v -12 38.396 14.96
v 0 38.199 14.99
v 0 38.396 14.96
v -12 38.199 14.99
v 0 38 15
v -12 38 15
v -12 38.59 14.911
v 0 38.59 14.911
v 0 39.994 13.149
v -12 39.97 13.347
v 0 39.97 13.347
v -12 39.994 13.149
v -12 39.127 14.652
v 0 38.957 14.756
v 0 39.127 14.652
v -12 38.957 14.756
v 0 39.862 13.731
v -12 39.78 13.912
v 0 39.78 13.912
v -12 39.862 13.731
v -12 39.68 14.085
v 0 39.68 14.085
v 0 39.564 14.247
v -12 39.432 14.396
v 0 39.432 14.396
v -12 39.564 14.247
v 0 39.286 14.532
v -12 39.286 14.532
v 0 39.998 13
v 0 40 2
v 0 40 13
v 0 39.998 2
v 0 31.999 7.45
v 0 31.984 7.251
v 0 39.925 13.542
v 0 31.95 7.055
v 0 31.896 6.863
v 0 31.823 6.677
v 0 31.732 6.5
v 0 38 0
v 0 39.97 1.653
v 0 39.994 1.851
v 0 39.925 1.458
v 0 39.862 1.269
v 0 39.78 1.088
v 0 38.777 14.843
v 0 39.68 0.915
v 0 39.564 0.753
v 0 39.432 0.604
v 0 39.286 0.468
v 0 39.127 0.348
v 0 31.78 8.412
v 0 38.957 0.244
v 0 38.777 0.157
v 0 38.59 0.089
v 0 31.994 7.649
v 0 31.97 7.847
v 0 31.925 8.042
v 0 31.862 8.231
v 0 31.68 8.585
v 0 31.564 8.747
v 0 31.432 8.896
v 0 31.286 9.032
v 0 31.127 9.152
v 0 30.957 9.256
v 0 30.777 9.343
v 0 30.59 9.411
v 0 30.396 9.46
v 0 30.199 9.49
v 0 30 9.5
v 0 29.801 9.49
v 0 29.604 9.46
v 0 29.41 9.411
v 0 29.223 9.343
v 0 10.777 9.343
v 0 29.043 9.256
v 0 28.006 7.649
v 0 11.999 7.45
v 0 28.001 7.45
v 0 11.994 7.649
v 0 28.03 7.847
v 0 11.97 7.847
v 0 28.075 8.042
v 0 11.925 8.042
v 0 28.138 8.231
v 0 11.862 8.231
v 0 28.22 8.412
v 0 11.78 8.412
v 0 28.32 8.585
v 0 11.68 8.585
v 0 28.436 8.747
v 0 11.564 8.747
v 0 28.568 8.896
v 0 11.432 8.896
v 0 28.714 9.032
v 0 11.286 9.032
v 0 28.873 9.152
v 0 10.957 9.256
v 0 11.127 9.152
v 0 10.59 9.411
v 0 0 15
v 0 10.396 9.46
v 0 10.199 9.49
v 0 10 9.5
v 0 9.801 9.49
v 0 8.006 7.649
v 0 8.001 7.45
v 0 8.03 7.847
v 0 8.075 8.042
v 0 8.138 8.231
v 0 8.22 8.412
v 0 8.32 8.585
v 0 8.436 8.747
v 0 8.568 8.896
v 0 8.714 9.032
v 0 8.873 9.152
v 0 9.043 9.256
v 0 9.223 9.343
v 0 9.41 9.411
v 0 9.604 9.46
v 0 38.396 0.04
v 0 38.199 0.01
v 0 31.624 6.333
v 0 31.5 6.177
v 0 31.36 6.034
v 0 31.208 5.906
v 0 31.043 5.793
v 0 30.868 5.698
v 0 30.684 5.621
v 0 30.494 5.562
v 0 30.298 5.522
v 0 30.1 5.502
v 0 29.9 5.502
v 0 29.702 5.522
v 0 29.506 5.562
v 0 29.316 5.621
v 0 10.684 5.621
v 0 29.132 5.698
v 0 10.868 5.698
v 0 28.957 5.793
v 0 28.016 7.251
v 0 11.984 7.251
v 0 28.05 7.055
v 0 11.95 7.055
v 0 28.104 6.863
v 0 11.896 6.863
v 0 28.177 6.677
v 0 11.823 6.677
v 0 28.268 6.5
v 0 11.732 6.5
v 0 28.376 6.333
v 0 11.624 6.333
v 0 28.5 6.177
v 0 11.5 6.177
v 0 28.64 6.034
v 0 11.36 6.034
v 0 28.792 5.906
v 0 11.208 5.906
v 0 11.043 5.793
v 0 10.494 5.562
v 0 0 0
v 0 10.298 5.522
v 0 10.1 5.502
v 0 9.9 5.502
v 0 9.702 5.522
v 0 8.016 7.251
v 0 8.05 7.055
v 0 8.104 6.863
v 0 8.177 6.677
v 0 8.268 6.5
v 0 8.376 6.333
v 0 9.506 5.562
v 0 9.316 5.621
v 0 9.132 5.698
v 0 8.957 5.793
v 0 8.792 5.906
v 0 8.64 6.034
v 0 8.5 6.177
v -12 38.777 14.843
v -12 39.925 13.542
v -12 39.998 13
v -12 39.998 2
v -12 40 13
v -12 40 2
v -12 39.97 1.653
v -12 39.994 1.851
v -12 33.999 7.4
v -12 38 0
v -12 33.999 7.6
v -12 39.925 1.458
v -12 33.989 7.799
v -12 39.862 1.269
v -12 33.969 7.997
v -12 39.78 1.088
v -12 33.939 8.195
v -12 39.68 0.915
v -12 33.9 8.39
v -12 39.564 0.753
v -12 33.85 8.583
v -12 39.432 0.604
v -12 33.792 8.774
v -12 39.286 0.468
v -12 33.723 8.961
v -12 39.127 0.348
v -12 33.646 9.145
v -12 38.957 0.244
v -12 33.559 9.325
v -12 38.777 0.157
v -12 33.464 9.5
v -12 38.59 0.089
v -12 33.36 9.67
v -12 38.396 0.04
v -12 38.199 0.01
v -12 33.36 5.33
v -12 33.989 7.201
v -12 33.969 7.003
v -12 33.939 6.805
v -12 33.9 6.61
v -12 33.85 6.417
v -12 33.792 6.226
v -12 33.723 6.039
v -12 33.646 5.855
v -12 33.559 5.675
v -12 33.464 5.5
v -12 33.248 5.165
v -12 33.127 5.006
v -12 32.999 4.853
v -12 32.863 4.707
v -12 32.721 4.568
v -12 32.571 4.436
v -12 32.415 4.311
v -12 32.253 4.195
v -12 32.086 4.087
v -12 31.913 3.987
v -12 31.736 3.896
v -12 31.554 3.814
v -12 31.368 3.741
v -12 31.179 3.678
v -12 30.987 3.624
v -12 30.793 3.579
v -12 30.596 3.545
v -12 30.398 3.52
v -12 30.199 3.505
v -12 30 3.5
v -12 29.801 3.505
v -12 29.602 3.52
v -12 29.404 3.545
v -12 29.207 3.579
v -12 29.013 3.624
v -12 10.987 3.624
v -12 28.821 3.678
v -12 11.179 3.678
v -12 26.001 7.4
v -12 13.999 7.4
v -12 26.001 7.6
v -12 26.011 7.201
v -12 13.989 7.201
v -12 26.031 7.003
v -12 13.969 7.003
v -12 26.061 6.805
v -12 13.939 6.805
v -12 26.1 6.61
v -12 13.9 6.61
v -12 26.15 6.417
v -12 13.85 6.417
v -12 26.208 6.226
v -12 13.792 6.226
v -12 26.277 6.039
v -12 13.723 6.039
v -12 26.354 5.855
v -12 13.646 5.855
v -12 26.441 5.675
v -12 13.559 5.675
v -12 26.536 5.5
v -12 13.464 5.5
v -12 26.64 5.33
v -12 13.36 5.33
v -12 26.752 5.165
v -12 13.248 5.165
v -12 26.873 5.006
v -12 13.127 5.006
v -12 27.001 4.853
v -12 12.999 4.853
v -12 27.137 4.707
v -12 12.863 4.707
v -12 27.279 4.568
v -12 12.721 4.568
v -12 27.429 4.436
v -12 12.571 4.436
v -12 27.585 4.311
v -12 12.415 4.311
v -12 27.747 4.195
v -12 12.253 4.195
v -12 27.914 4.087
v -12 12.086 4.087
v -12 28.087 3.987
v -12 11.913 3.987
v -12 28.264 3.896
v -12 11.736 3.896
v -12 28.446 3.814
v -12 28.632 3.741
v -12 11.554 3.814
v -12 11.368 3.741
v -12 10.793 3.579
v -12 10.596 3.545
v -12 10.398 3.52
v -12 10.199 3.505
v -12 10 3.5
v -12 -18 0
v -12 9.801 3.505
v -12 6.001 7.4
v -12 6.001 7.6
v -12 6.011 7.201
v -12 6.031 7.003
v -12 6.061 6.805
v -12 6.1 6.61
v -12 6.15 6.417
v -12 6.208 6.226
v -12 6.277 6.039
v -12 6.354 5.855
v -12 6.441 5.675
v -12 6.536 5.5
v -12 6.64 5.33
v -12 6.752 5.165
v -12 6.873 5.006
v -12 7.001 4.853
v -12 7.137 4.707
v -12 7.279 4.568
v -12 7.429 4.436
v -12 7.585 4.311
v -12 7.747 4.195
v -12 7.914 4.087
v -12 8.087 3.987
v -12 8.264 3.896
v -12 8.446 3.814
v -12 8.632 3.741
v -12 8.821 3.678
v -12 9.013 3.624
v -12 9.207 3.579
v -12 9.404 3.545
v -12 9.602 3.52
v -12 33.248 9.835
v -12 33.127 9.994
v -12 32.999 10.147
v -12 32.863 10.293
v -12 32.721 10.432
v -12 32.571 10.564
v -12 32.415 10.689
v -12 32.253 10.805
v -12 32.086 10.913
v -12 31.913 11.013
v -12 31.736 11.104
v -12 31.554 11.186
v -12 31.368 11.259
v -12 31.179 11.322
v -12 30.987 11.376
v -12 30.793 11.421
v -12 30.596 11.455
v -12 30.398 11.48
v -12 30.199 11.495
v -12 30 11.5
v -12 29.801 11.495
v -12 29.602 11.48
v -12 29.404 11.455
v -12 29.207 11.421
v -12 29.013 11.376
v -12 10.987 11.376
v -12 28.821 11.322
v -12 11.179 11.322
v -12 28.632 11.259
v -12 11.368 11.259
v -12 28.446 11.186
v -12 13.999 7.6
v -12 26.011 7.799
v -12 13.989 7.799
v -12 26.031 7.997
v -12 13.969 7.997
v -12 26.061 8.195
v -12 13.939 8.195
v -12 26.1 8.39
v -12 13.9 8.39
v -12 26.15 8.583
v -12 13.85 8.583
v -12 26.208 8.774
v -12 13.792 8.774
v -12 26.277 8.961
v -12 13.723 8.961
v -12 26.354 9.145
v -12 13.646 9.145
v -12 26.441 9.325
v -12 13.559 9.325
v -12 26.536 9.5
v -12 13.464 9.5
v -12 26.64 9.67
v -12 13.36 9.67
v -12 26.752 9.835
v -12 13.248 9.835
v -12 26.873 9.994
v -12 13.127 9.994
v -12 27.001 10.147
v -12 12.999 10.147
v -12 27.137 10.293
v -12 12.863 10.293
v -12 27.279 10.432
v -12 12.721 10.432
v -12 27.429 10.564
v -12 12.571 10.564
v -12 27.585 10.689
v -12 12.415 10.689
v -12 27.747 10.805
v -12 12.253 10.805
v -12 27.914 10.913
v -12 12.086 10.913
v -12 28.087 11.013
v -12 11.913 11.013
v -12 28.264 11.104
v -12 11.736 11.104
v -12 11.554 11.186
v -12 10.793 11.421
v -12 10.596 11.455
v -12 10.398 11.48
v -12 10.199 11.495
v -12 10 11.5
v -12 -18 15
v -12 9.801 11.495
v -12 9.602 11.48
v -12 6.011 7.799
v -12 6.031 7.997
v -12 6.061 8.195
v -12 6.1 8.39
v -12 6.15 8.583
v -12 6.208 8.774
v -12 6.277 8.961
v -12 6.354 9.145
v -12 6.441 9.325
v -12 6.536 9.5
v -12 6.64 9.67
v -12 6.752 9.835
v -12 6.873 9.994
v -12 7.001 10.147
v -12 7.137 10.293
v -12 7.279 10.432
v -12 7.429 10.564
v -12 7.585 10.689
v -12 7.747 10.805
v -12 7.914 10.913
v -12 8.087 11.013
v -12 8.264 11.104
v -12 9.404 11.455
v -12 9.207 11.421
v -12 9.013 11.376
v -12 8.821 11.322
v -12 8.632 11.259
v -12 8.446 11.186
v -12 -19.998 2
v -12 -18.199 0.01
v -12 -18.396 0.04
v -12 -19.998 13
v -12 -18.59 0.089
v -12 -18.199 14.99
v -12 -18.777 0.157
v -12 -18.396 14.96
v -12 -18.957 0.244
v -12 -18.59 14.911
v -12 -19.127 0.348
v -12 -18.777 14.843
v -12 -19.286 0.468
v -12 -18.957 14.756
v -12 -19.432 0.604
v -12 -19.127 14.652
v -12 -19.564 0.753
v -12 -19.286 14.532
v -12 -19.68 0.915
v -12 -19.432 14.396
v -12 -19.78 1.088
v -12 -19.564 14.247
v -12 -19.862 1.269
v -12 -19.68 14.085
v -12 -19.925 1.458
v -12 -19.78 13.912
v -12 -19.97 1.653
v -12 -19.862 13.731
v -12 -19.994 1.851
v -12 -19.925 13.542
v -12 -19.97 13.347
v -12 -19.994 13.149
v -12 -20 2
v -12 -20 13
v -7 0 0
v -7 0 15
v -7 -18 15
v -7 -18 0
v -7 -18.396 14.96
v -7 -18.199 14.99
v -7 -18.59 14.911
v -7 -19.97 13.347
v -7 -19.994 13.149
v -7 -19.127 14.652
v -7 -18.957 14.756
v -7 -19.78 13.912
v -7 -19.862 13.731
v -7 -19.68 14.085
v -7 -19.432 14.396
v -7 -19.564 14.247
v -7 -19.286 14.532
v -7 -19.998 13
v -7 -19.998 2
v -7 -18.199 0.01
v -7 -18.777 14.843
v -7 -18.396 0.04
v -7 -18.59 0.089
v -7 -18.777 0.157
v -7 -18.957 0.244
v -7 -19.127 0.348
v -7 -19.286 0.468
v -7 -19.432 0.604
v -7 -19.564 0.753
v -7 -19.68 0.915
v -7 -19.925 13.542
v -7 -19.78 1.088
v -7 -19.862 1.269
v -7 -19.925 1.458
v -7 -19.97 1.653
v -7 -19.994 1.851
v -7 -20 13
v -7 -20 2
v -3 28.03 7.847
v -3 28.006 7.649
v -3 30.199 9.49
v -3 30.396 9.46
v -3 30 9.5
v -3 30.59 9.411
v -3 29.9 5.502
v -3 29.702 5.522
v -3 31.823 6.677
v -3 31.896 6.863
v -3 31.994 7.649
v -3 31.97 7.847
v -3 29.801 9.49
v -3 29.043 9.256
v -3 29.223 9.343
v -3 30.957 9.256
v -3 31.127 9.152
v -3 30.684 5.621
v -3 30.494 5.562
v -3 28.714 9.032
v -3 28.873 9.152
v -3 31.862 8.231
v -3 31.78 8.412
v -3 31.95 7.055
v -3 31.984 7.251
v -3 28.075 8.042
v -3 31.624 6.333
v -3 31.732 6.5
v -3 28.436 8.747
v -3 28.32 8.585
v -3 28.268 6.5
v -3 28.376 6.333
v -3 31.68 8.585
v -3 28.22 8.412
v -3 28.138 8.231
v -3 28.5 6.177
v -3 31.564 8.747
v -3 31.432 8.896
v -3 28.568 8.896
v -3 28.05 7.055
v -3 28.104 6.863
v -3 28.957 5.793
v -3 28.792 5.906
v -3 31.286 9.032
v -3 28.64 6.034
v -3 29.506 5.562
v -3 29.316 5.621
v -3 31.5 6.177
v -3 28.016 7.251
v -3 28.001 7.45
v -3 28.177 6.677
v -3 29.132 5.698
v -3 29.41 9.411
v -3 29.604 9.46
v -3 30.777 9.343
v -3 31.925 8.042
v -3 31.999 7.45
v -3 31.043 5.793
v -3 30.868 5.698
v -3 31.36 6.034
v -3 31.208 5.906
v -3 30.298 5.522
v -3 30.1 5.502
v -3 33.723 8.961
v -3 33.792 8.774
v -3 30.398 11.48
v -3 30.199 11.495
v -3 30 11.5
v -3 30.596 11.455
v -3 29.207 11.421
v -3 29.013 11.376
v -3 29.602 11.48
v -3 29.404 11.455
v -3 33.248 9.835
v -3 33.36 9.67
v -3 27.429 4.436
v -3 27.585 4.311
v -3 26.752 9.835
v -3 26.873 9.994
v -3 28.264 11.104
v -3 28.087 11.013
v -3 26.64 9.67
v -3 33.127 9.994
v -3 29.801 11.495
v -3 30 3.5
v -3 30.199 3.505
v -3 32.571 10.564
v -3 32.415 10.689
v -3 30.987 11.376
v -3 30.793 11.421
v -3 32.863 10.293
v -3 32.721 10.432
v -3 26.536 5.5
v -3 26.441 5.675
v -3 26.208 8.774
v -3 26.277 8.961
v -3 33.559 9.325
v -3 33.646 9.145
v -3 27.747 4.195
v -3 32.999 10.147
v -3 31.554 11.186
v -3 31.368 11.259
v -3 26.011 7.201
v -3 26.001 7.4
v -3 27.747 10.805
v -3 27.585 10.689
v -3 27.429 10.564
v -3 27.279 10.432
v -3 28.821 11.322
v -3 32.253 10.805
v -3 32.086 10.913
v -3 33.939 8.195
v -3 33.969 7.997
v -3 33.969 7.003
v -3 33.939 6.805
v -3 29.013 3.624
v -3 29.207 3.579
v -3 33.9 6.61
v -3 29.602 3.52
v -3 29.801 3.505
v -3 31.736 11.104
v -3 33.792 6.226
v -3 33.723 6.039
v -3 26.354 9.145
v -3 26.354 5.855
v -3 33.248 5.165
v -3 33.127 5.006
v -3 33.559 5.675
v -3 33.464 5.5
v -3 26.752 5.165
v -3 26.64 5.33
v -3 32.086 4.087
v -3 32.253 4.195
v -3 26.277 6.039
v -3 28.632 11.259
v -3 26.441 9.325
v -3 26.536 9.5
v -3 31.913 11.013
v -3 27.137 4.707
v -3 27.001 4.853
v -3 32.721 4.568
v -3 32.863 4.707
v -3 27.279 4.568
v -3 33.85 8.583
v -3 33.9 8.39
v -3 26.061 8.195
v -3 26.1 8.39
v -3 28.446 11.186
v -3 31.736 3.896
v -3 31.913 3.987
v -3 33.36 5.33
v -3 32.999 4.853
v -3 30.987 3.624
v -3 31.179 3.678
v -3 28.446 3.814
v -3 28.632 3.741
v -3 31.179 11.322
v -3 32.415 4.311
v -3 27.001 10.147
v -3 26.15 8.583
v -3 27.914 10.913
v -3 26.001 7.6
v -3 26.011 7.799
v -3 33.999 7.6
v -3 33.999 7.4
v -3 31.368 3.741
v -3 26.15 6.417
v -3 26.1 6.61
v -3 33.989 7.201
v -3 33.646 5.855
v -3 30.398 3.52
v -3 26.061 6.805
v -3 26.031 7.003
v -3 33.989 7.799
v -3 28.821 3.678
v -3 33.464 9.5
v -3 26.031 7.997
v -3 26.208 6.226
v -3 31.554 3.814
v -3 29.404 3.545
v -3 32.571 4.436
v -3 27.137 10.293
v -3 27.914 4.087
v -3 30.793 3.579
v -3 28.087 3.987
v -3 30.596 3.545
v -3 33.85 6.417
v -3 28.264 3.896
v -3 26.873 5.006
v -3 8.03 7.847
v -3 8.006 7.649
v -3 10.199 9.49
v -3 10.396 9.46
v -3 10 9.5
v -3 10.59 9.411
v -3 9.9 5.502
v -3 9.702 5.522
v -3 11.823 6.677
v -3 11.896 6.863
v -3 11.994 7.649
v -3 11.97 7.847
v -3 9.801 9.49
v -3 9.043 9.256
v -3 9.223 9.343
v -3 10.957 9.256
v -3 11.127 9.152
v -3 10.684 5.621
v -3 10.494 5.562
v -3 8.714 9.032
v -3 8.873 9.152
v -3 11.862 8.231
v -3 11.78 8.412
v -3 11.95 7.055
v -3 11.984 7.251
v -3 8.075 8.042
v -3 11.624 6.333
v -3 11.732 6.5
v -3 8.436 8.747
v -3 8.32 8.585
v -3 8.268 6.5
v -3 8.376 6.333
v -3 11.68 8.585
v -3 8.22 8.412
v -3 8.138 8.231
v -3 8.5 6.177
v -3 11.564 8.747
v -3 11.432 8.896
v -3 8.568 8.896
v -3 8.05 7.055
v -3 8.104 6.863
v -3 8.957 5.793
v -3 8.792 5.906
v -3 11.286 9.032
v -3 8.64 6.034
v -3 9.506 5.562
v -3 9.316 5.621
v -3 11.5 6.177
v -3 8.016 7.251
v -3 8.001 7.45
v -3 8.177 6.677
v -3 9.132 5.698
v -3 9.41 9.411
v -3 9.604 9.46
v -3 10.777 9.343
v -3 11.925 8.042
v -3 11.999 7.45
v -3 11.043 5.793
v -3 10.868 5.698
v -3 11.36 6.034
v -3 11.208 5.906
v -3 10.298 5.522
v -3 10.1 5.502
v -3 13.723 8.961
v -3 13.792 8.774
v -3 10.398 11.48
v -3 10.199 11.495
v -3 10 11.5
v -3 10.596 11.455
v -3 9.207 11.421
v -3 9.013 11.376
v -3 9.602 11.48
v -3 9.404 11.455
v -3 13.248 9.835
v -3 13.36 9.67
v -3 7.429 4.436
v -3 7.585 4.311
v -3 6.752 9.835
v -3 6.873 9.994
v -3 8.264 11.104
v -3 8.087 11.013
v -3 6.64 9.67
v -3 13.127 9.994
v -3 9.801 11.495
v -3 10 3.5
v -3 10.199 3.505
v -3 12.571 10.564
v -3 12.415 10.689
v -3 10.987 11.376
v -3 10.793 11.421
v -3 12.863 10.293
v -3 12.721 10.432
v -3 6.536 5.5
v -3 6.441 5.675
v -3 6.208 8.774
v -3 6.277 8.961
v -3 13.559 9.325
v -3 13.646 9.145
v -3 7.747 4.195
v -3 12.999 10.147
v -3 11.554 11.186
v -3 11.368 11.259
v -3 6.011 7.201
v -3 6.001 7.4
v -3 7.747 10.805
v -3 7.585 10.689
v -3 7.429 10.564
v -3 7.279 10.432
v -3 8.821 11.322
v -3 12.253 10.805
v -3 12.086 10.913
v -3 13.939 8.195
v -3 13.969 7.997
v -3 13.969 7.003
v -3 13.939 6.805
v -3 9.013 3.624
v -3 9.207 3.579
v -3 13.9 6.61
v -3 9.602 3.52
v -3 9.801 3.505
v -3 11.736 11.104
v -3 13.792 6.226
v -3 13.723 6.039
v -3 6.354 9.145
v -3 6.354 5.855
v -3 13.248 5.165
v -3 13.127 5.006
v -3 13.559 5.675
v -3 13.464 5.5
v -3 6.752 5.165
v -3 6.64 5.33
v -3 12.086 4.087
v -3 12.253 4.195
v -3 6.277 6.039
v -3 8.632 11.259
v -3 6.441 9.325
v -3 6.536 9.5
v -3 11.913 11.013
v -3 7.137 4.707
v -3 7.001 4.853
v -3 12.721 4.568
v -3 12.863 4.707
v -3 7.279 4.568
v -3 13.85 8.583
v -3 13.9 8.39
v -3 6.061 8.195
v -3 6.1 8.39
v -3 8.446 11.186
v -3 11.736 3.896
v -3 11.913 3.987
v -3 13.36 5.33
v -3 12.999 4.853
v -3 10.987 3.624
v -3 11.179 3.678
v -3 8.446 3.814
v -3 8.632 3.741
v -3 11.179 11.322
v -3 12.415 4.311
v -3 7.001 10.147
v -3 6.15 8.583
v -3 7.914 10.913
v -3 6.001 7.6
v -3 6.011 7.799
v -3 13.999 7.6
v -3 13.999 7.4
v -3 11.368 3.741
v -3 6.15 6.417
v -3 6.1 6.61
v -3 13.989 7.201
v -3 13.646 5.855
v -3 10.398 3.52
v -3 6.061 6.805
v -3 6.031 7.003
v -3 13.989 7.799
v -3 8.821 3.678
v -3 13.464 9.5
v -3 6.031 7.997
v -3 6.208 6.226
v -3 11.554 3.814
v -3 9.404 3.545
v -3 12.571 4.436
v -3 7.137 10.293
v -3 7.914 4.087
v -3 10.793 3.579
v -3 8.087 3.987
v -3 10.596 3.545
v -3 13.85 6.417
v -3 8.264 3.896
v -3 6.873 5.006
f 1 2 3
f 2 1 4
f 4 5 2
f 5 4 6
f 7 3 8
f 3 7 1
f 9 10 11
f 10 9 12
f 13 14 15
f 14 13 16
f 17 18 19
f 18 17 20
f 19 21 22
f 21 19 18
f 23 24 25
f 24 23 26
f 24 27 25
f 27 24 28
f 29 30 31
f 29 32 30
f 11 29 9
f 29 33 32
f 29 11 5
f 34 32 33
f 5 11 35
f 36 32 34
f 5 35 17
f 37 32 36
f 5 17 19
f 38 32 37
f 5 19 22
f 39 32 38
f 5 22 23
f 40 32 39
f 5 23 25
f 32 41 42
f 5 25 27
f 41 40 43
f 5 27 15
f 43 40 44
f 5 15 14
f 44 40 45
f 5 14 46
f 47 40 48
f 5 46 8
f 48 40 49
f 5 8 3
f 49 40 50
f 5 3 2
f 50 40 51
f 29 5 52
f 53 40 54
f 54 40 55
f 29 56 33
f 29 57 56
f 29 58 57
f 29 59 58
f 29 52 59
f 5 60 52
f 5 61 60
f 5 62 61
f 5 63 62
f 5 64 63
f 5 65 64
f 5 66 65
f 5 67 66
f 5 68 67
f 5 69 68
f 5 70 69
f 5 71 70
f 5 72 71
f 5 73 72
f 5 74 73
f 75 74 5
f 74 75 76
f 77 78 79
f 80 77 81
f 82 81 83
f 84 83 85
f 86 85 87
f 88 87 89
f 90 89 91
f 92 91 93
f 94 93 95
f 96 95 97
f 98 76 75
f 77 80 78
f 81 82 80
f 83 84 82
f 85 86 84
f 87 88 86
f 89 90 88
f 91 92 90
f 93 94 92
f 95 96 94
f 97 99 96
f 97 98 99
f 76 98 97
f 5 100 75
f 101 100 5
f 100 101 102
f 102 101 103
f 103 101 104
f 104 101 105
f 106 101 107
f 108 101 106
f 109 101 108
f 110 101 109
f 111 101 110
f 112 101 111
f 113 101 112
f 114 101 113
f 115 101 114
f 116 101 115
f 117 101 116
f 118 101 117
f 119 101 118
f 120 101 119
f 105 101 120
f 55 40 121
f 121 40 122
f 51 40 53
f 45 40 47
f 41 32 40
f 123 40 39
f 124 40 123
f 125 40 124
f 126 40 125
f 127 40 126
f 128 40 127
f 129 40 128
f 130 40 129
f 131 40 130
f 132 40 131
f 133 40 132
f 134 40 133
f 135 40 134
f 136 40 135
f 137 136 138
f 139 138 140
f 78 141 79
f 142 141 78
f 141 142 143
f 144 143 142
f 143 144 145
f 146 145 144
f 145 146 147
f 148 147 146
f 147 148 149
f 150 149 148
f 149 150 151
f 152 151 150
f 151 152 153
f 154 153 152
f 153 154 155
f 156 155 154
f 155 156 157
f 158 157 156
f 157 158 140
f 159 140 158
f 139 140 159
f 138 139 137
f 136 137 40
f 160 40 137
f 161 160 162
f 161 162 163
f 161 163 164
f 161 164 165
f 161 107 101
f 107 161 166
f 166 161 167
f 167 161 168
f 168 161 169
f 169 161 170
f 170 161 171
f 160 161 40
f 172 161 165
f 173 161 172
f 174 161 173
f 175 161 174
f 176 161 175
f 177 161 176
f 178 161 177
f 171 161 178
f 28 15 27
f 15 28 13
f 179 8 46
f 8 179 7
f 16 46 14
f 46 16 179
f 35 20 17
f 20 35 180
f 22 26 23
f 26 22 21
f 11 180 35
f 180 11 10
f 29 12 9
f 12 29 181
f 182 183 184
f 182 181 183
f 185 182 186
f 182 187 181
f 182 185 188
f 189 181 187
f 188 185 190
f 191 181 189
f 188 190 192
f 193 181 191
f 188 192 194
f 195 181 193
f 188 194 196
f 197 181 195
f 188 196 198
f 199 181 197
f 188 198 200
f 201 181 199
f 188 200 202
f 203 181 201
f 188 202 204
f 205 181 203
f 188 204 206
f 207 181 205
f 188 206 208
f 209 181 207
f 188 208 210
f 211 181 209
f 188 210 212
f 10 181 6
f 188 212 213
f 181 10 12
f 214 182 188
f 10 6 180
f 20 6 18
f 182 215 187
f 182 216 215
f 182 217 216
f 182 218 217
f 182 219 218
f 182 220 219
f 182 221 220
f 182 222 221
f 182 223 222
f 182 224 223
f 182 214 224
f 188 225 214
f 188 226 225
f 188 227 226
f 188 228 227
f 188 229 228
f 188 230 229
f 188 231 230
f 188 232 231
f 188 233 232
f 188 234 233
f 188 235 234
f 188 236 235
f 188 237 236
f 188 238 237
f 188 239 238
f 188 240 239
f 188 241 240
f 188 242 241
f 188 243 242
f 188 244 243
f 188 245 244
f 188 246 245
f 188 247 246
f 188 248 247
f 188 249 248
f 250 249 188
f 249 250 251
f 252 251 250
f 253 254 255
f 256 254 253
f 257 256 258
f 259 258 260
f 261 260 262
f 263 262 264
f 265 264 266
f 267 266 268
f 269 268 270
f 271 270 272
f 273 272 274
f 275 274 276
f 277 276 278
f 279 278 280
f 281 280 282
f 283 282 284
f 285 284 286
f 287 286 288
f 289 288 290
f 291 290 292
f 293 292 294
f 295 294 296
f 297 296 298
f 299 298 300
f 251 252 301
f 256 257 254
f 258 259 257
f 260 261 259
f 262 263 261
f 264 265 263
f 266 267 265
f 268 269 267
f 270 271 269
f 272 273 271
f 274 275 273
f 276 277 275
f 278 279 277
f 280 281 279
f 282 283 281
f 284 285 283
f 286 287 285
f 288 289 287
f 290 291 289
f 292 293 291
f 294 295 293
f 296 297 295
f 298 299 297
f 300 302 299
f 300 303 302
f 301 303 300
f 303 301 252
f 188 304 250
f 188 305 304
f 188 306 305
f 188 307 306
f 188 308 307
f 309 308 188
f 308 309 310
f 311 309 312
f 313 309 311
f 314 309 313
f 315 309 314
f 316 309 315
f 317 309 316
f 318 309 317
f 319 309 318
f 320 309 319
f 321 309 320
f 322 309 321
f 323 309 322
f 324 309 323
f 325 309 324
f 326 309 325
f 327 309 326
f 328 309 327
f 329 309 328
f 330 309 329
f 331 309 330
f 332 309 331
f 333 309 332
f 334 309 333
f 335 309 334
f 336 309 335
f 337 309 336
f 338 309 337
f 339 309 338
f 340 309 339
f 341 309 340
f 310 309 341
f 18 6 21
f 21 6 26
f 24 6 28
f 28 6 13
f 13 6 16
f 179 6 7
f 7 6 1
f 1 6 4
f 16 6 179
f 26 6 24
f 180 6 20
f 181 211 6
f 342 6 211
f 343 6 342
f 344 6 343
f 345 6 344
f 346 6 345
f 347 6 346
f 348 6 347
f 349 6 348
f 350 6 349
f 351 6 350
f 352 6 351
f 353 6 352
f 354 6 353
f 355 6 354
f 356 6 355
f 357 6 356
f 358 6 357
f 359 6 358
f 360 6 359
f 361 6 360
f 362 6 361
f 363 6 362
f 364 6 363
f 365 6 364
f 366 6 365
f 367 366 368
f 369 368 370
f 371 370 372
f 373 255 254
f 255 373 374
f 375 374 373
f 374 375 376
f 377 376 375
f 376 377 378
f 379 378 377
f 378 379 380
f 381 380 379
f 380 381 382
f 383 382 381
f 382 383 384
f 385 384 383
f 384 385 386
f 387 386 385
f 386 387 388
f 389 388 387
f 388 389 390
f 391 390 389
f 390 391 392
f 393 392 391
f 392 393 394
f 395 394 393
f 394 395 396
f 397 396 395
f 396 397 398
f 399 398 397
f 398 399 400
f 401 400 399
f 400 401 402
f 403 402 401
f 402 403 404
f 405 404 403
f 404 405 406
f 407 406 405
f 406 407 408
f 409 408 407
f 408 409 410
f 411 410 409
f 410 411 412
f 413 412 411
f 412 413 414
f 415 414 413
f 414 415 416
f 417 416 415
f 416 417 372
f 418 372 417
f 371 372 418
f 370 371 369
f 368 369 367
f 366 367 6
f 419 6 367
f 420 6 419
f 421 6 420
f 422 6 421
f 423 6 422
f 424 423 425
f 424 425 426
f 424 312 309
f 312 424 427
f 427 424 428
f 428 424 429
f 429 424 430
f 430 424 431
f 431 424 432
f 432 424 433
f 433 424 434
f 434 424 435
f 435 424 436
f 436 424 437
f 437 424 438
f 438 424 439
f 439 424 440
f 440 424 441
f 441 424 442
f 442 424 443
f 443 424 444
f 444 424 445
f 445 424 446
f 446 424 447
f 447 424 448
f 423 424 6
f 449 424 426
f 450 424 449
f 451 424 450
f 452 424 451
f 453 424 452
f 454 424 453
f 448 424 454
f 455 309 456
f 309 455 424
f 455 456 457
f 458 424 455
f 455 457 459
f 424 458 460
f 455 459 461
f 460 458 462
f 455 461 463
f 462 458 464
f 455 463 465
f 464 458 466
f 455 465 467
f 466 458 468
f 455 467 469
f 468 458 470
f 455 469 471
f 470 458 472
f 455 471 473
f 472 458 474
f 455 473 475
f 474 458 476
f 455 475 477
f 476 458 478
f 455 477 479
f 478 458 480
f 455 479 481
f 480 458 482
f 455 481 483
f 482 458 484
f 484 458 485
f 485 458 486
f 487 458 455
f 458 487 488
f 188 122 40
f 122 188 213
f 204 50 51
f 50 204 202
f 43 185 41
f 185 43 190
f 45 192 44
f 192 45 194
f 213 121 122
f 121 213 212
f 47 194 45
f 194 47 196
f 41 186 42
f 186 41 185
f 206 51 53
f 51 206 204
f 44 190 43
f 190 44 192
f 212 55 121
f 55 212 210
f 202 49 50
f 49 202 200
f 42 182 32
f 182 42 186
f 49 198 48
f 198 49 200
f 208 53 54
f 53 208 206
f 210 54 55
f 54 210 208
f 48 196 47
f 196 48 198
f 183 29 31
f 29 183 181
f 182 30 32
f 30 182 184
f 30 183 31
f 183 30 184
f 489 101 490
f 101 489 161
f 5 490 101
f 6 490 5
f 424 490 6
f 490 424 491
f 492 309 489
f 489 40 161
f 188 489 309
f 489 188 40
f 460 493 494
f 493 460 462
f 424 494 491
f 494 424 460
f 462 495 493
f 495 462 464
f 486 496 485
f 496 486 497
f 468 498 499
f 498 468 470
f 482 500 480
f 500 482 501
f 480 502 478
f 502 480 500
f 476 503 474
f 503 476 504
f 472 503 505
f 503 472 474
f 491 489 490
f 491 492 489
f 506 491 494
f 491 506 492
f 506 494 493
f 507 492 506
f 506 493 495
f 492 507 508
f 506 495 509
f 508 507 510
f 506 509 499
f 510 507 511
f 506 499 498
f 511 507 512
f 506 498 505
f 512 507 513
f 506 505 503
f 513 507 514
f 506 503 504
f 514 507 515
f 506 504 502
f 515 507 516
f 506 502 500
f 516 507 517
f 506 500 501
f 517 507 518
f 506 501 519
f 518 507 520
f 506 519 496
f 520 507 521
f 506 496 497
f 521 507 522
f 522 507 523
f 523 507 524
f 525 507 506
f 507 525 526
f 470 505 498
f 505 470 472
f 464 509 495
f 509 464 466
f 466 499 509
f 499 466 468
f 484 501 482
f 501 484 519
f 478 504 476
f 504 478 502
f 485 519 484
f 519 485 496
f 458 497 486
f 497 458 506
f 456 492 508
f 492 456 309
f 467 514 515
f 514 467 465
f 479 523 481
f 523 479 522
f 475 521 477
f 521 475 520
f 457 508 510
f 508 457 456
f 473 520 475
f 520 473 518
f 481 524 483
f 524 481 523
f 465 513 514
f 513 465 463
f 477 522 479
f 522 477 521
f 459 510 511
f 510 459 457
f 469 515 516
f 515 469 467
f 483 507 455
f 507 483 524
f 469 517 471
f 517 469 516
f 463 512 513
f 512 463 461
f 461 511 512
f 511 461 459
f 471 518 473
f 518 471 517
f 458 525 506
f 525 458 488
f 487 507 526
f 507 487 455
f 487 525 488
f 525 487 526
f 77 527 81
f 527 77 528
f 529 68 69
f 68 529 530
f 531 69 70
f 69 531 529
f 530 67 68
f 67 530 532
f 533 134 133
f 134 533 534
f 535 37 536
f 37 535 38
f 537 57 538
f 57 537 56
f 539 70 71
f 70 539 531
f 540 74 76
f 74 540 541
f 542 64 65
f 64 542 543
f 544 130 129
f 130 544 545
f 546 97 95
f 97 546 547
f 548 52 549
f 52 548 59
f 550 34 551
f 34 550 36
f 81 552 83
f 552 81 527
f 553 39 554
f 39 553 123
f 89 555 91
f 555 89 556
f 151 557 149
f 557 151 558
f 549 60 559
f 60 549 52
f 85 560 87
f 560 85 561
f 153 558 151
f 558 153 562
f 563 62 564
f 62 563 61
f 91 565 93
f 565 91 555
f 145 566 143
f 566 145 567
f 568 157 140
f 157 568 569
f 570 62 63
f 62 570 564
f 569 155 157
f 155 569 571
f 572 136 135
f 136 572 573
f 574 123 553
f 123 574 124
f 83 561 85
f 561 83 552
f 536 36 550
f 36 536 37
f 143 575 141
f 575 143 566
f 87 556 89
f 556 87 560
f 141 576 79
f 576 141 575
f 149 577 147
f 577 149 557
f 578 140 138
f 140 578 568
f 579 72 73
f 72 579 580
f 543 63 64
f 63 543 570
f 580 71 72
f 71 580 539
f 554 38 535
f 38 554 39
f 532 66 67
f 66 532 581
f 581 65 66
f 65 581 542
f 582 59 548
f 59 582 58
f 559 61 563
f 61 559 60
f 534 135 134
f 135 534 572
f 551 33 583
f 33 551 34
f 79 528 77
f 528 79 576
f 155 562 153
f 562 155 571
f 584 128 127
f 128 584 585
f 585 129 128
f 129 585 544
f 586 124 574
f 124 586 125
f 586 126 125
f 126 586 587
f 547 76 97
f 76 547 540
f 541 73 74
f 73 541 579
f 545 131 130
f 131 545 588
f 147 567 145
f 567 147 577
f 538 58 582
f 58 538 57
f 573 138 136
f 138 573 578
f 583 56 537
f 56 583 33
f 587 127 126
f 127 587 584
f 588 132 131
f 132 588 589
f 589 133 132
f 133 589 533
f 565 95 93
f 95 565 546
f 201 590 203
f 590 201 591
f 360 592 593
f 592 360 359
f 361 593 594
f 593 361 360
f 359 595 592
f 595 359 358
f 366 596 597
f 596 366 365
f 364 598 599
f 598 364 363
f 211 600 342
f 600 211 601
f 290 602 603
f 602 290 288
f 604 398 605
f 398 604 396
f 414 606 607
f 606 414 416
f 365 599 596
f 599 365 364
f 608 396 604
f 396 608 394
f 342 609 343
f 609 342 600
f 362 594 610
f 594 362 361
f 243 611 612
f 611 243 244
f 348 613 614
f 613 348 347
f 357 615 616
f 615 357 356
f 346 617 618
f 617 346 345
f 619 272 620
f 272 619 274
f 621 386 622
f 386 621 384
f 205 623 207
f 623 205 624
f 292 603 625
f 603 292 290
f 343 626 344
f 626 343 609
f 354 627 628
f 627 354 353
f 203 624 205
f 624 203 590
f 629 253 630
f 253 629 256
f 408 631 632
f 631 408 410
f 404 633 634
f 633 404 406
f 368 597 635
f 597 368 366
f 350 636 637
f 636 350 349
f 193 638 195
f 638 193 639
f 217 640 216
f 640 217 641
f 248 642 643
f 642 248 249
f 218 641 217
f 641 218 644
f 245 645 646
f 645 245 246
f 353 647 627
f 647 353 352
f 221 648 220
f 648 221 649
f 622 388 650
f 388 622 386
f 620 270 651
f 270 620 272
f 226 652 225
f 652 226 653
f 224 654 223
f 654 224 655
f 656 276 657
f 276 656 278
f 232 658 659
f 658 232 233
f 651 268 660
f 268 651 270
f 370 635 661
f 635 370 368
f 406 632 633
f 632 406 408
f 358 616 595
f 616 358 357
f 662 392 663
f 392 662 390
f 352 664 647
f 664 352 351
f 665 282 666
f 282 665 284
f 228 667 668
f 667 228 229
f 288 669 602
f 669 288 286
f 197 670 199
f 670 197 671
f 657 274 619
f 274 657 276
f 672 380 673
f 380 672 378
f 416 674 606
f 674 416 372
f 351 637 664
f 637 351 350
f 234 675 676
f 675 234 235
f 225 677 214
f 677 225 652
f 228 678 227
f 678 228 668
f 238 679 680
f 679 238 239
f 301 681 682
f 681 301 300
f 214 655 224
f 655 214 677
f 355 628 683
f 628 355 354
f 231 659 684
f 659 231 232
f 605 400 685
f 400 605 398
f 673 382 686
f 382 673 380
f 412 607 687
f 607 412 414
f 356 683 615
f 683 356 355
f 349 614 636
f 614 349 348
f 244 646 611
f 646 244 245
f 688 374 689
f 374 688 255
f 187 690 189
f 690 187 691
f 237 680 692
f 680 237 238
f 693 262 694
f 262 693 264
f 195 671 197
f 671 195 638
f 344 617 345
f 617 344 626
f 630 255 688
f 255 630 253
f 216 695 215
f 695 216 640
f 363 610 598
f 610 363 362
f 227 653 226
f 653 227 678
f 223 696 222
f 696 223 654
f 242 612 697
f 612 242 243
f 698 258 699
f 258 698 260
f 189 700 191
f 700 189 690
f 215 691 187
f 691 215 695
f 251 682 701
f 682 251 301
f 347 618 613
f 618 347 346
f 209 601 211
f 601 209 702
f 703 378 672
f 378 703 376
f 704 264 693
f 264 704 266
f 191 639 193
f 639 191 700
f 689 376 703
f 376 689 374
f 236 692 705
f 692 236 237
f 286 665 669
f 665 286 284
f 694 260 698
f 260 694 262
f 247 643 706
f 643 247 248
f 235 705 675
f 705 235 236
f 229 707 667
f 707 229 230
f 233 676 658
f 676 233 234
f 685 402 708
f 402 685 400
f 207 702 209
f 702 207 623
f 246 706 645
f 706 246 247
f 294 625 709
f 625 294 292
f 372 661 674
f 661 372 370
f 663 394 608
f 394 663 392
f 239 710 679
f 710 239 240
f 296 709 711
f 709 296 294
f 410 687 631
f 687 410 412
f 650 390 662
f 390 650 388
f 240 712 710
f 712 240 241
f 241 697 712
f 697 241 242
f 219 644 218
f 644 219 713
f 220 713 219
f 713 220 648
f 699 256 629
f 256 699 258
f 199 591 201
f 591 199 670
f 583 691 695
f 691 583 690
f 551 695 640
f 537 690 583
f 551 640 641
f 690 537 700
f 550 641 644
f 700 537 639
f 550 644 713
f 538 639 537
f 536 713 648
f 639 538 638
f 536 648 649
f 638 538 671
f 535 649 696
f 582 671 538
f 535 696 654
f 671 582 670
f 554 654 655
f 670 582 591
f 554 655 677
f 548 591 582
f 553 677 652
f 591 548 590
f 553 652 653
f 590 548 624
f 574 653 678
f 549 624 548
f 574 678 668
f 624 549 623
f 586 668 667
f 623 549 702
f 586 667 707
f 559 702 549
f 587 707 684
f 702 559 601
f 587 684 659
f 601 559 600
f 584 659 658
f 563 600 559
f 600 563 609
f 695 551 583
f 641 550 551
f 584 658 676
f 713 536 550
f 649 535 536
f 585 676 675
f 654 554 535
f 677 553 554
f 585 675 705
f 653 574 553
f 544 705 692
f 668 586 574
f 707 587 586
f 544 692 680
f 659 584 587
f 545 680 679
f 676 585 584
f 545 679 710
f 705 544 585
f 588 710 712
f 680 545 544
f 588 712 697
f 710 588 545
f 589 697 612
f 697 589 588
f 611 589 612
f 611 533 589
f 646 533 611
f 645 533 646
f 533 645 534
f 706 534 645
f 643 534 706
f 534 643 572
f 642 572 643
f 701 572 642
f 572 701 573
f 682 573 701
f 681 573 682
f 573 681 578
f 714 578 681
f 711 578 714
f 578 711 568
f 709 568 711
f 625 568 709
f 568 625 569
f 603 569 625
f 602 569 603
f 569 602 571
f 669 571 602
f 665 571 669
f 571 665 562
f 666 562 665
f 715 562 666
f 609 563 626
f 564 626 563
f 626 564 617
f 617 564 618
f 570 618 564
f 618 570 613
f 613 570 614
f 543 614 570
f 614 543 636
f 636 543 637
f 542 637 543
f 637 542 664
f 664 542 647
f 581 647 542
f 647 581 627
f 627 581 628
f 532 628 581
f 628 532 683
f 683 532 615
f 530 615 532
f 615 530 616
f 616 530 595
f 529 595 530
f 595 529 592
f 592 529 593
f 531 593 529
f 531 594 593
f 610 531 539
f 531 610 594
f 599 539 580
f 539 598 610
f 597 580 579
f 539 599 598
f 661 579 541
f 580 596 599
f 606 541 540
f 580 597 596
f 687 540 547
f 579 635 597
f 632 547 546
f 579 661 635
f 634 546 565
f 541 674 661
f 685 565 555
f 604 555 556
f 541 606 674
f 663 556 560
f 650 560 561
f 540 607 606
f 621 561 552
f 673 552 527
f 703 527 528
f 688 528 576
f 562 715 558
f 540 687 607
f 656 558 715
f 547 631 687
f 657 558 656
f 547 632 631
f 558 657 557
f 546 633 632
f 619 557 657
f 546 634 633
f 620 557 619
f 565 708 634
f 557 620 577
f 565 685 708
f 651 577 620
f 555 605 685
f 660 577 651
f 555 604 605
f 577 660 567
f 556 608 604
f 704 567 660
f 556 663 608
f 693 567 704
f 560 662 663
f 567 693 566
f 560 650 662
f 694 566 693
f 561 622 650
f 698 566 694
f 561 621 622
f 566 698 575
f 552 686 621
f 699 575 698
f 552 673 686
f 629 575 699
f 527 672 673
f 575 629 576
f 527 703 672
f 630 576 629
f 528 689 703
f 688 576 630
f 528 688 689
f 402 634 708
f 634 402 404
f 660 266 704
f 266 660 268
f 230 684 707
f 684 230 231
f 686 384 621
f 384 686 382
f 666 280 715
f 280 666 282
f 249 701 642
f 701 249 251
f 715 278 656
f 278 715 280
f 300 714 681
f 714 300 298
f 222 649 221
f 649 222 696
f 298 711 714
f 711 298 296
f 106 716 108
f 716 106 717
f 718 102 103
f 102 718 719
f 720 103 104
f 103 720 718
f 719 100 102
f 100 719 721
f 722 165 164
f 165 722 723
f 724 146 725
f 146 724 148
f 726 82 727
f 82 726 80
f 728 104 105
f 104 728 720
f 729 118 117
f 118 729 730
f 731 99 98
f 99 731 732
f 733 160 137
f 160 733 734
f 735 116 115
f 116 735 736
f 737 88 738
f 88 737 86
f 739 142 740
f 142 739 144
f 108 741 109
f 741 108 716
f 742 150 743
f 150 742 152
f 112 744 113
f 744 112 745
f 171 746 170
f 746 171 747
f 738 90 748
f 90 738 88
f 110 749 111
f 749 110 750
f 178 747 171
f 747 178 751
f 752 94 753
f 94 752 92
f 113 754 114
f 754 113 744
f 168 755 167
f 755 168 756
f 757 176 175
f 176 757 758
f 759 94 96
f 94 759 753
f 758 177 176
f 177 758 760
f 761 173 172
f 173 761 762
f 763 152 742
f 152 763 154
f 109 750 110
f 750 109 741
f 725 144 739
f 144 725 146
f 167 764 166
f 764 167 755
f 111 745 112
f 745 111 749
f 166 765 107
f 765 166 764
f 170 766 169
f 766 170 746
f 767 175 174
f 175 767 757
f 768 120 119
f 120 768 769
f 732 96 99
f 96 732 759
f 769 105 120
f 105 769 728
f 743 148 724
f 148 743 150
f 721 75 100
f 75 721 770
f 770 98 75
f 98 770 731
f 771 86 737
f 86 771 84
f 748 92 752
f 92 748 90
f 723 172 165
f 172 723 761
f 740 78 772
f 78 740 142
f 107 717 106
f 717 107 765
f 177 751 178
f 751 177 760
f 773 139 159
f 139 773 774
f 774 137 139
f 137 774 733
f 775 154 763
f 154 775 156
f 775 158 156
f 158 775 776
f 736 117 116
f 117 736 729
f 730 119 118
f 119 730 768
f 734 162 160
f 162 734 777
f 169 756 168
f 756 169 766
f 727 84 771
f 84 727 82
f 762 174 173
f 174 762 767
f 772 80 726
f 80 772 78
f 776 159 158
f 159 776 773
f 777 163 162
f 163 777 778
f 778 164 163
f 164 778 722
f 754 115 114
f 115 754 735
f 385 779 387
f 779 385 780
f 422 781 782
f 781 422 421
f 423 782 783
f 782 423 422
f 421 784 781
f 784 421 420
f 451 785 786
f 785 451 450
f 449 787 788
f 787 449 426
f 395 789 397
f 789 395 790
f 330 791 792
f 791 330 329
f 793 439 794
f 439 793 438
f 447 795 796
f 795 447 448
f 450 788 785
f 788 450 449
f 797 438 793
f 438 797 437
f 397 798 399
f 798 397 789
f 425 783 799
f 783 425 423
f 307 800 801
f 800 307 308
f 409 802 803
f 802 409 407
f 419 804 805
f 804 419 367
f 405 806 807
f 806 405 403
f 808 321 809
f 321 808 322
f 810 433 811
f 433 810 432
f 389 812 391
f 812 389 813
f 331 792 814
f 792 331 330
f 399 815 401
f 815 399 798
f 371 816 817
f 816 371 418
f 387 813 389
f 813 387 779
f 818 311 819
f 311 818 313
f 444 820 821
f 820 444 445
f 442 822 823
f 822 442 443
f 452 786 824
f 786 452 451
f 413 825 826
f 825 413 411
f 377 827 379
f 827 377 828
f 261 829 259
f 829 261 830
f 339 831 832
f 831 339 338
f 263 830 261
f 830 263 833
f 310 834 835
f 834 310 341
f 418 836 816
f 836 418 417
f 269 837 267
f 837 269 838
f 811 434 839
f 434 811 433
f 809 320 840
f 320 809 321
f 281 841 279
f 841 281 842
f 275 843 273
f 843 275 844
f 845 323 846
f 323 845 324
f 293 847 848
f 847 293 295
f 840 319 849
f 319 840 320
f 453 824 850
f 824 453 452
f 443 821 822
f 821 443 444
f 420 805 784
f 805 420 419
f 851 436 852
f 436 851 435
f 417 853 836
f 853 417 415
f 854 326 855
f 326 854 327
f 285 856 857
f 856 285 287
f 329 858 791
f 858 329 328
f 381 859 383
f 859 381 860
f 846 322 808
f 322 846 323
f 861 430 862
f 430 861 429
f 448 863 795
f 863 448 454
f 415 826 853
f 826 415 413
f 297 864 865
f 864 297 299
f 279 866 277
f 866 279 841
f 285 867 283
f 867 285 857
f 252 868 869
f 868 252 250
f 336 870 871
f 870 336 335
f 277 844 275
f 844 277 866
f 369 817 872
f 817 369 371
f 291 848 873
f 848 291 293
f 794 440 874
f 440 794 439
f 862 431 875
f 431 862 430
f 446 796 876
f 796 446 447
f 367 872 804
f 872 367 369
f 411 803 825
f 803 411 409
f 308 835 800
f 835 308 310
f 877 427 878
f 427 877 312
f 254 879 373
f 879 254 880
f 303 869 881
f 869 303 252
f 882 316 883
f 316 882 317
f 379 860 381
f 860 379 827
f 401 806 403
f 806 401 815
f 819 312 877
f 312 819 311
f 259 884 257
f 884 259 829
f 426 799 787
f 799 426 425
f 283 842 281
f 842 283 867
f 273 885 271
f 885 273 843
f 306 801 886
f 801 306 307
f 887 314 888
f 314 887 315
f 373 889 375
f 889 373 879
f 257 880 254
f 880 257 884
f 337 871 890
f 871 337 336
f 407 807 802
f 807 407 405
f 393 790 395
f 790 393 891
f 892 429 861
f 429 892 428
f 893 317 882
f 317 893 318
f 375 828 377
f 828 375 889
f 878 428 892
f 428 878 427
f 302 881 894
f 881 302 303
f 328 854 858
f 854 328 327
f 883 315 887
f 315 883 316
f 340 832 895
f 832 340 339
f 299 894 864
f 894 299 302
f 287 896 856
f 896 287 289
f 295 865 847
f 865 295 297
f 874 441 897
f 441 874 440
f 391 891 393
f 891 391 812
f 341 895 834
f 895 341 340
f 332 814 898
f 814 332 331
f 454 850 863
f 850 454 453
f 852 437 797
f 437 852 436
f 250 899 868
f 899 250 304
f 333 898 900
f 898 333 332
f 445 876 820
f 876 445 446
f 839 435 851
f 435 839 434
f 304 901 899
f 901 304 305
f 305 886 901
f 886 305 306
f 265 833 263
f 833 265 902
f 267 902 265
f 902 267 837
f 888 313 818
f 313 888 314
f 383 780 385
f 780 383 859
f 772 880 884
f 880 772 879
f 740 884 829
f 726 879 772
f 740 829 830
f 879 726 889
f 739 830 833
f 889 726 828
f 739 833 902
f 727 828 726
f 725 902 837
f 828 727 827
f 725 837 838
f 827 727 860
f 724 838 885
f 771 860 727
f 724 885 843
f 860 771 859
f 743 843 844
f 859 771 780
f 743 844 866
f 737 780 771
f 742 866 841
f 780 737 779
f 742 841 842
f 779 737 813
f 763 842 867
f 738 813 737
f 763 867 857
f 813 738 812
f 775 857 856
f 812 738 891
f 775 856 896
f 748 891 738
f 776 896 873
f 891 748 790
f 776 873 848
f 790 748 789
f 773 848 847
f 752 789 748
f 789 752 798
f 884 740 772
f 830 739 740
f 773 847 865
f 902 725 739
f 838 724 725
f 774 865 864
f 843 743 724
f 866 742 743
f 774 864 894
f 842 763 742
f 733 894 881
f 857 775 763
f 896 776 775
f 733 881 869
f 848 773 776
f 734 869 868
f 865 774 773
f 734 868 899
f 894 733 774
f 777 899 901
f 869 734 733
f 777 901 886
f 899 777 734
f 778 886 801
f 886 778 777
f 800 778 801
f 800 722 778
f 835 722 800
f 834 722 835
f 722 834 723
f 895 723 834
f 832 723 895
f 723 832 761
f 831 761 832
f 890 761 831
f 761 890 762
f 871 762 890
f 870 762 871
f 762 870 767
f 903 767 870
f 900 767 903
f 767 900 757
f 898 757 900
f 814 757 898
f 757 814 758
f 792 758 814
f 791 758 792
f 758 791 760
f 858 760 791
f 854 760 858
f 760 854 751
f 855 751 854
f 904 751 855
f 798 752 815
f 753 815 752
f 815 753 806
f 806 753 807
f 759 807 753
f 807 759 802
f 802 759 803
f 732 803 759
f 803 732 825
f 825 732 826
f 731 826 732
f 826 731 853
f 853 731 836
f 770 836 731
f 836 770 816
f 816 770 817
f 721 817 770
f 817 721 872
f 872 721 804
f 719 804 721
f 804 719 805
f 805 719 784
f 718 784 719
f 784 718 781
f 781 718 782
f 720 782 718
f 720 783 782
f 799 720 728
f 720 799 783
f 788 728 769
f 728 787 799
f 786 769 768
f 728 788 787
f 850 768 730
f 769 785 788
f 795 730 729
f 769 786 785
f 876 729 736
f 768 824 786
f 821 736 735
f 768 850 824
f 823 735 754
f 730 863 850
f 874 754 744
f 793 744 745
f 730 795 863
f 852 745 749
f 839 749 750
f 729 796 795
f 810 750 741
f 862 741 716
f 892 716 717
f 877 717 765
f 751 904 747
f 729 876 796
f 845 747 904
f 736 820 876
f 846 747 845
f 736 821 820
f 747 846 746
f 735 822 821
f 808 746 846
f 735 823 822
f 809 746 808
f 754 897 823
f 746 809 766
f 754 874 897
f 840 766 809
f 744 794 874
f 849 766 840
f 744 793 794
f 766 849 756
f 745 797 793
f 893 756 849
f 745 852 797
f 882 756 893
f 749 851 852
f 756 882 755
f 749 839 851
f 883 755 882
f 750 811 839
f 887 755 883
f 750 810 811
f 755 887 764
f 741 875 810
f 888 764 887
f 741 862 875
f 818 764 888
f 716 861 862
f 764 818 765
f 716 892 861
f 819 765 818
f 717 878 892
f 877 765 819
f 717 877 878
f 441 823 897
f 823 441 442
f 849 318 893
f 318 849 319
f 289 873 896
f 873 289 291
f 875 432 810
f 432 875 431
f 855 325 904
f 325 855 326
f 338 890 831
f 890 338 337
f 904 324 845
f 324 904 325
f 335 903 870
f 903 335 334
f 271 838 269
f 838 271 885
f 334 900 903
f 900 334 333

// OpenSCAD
// file: cable-holder-2.scad
$fa = 1.0;
$fs = 0.2;

use <../lib/lib.scad>

holeDiameter = 4.5;

module asztal()
{
	cube([50, 50, 10]);
}

module screwCut()
{
	translate([0, 0, -20])
	cylinder(d = 4, h = 40);

	cylinder(d = 8, h = 20);
}

module cableHolder2
(
)
{
	difference()
	{
		union()
		{
			rotate([0, -90, 0])
			rcube
			(
				[15, 40, 12],
				r = 4,
				flat = true,
				singleSided = true,
				aX = 0,
				aY = 0,
				aZ = 0
			);

			translate([-7, 0, 0])
			mirror([0, 1, 0])
			rotate([0, -90, 0])
			rcube
			(
				[15, 20, 5],
				r = 4,
				flat = true,
				singleSided = true,
				aX = 0,
				aY = 0,
				aZ = 0
			);
		}

		translate([-3, 30, 7.5])
		rotate([0, -90, 0])
		screwCut();

		translate([-3, 10, 7.5])
		rotate([0, -90, 0])
		screwCut();
	}
}
// file: ../lib/lib.scad
function sel(v, indices) = [ for (i = indices) v[i] ];
function eps() = 0.01;

module cmirror(v = [1, 0, 0])
{
	children();
	mirror(v)
		children();
}

module rcube2d
(
	s = [10, 10, 10],
	r = 2,
	singleSided = false,
)
{
	width = s[0];
	depth = s[1];
	height = s[2];

	union()
	{
		cmirror([0, 1, 0])
		cmirror()
		translate([(width - r) / 2, (depth - r) / 2, 0])
		cylinder(h = height, d = r);
		translate([-(width - r) / 2, -depth / 2, 0])
		cube([width - r, depth, height]);
		translate([-width / 2, -(depth - r) / 2, 0])
		cube([width, depth - r, height]);
	}

	if (singleSided)
	{
		translate([-width / 2, -depth / 2, 0])
		cube([width, r, height]);
	}
}

module rcube3d
(
	s = [10, 10, 10],
	r = 2,
	singleSided = false,
)
{
	width = s[0];
	depth = s[1];
	height = s[2];

	w2 = width - r;
	d2 = depth - r;
	h2 = height - r;

	translate([0, 0, r / 2])
	rcube2d([width, depth, h2], r);

	translate([0, 0, height / 2])
	cmirror([0, 0, 1])
	cmirror([0, 1, 0])
	translate([0, d2 / 2, (height - r) / 2])
	translate([-w2 / 2, 0, 0])
	rotate([0, 90, 0])
	cylinder(h = w2, d = r);

	translate([0, 0, height / 2])
	cmirror([0, 0, 1])
	cmirror()
	translate([w2 / 2, 0, h2 / 2])
	translate([0, d2 / 2, 0])
	rotate([90, 0, 0])
	cylinder(h = d2, d = r);

	translate([-w2 / 2, -d2 / 2, 0])
	cube([w2, d2, height]);

	translate([0, 0, height / 2])
	cmirror([0, 0, 1])
	cmirror([0, 1, 0])
	cmirror()
	translate([w2 / 2, d2 / 2, h2 / 2])
	sphere(r / 2);

	if (singleSided)
	{
		translate([0, -depth / 2, height / 2])
		rotate([-90, 0, 0])
		rcube2d([width, height, r], r);
	}
}

module rcube
(
	s = [10, 10, 10],
	r = 2,
	flat = true,
	singleSided = false,
	aX = 0,
	aY = 0,
	aZ = 0,
)
{
	width = s[0];
	depth = s[1];
	height = s[2];

	rw = r > width ? width : r;

	translate
	([
		(1 - aX) * width / 2,
		(1 - aY) * depth / 2,
		-aZ * height / 2
	])
	if (flat)
		rcube2d(s, rw, singleSided);
	else
	{
		rh = rw > height ? height : rw;
		rcube3d(s, rh, singleSided);
	}
}

module chamfer
(
	s = [10, 20, 6],
	round = true,
	aX = 0,
	aY = 0,
	aZ = 0,
	rotation = 0,
)
{
	width = s[0];
	depth = s[1];
	height = s[2];

	r = width < height ? width : height;

	rotate([0, rotation * 90, 0])
	translate
	([
		-aX * r / 2,
		-aY * depth / 2,
		-aZ * r / 2
	])
	if (round)
	{
		difference()
		{
			cube(s);

			translate([r, -depth / 2, 0])
			union()
			{
				translate([0, 0, r])
				rotate([-90, 0, 0])
				cylinder(d = 2 * r, h = 2 * depth);

				translate([0, 0, -r / 2])
				cube([2 * width, 2 * depth, 2 * r]);

				translate([-1.5 * r, 0, r])
				cube([2 * r, 2 * depth, 2 * height]);
			}
		}
	}
	else
	{
		difference()
		{
			cube(s);

			translate([0, 1.5 * depth, 0])
			rotate([90, 0, 0])
			linear_extrude(2 * depth)
			polygon
			([
				[ 2 * width, -1 * height],
				[ 2 * width,  2 * height],
				[-1 * width,  2 * height],
			]);
		}
	}
}
// main file
$fa = 1.0;
$fs = 0.2;

use <../lib/lib.scad>
use <./cable-holder-2.scad>

asztalShow = false;

if (asztalShow)
{
	translate([-25, 0, 0])
	asztal();

	translate([-25, -60, 0])
	asztal();

	rotate([0, -90, 0])
		cableHolder2();
} else {
	cableHolder2();
}
